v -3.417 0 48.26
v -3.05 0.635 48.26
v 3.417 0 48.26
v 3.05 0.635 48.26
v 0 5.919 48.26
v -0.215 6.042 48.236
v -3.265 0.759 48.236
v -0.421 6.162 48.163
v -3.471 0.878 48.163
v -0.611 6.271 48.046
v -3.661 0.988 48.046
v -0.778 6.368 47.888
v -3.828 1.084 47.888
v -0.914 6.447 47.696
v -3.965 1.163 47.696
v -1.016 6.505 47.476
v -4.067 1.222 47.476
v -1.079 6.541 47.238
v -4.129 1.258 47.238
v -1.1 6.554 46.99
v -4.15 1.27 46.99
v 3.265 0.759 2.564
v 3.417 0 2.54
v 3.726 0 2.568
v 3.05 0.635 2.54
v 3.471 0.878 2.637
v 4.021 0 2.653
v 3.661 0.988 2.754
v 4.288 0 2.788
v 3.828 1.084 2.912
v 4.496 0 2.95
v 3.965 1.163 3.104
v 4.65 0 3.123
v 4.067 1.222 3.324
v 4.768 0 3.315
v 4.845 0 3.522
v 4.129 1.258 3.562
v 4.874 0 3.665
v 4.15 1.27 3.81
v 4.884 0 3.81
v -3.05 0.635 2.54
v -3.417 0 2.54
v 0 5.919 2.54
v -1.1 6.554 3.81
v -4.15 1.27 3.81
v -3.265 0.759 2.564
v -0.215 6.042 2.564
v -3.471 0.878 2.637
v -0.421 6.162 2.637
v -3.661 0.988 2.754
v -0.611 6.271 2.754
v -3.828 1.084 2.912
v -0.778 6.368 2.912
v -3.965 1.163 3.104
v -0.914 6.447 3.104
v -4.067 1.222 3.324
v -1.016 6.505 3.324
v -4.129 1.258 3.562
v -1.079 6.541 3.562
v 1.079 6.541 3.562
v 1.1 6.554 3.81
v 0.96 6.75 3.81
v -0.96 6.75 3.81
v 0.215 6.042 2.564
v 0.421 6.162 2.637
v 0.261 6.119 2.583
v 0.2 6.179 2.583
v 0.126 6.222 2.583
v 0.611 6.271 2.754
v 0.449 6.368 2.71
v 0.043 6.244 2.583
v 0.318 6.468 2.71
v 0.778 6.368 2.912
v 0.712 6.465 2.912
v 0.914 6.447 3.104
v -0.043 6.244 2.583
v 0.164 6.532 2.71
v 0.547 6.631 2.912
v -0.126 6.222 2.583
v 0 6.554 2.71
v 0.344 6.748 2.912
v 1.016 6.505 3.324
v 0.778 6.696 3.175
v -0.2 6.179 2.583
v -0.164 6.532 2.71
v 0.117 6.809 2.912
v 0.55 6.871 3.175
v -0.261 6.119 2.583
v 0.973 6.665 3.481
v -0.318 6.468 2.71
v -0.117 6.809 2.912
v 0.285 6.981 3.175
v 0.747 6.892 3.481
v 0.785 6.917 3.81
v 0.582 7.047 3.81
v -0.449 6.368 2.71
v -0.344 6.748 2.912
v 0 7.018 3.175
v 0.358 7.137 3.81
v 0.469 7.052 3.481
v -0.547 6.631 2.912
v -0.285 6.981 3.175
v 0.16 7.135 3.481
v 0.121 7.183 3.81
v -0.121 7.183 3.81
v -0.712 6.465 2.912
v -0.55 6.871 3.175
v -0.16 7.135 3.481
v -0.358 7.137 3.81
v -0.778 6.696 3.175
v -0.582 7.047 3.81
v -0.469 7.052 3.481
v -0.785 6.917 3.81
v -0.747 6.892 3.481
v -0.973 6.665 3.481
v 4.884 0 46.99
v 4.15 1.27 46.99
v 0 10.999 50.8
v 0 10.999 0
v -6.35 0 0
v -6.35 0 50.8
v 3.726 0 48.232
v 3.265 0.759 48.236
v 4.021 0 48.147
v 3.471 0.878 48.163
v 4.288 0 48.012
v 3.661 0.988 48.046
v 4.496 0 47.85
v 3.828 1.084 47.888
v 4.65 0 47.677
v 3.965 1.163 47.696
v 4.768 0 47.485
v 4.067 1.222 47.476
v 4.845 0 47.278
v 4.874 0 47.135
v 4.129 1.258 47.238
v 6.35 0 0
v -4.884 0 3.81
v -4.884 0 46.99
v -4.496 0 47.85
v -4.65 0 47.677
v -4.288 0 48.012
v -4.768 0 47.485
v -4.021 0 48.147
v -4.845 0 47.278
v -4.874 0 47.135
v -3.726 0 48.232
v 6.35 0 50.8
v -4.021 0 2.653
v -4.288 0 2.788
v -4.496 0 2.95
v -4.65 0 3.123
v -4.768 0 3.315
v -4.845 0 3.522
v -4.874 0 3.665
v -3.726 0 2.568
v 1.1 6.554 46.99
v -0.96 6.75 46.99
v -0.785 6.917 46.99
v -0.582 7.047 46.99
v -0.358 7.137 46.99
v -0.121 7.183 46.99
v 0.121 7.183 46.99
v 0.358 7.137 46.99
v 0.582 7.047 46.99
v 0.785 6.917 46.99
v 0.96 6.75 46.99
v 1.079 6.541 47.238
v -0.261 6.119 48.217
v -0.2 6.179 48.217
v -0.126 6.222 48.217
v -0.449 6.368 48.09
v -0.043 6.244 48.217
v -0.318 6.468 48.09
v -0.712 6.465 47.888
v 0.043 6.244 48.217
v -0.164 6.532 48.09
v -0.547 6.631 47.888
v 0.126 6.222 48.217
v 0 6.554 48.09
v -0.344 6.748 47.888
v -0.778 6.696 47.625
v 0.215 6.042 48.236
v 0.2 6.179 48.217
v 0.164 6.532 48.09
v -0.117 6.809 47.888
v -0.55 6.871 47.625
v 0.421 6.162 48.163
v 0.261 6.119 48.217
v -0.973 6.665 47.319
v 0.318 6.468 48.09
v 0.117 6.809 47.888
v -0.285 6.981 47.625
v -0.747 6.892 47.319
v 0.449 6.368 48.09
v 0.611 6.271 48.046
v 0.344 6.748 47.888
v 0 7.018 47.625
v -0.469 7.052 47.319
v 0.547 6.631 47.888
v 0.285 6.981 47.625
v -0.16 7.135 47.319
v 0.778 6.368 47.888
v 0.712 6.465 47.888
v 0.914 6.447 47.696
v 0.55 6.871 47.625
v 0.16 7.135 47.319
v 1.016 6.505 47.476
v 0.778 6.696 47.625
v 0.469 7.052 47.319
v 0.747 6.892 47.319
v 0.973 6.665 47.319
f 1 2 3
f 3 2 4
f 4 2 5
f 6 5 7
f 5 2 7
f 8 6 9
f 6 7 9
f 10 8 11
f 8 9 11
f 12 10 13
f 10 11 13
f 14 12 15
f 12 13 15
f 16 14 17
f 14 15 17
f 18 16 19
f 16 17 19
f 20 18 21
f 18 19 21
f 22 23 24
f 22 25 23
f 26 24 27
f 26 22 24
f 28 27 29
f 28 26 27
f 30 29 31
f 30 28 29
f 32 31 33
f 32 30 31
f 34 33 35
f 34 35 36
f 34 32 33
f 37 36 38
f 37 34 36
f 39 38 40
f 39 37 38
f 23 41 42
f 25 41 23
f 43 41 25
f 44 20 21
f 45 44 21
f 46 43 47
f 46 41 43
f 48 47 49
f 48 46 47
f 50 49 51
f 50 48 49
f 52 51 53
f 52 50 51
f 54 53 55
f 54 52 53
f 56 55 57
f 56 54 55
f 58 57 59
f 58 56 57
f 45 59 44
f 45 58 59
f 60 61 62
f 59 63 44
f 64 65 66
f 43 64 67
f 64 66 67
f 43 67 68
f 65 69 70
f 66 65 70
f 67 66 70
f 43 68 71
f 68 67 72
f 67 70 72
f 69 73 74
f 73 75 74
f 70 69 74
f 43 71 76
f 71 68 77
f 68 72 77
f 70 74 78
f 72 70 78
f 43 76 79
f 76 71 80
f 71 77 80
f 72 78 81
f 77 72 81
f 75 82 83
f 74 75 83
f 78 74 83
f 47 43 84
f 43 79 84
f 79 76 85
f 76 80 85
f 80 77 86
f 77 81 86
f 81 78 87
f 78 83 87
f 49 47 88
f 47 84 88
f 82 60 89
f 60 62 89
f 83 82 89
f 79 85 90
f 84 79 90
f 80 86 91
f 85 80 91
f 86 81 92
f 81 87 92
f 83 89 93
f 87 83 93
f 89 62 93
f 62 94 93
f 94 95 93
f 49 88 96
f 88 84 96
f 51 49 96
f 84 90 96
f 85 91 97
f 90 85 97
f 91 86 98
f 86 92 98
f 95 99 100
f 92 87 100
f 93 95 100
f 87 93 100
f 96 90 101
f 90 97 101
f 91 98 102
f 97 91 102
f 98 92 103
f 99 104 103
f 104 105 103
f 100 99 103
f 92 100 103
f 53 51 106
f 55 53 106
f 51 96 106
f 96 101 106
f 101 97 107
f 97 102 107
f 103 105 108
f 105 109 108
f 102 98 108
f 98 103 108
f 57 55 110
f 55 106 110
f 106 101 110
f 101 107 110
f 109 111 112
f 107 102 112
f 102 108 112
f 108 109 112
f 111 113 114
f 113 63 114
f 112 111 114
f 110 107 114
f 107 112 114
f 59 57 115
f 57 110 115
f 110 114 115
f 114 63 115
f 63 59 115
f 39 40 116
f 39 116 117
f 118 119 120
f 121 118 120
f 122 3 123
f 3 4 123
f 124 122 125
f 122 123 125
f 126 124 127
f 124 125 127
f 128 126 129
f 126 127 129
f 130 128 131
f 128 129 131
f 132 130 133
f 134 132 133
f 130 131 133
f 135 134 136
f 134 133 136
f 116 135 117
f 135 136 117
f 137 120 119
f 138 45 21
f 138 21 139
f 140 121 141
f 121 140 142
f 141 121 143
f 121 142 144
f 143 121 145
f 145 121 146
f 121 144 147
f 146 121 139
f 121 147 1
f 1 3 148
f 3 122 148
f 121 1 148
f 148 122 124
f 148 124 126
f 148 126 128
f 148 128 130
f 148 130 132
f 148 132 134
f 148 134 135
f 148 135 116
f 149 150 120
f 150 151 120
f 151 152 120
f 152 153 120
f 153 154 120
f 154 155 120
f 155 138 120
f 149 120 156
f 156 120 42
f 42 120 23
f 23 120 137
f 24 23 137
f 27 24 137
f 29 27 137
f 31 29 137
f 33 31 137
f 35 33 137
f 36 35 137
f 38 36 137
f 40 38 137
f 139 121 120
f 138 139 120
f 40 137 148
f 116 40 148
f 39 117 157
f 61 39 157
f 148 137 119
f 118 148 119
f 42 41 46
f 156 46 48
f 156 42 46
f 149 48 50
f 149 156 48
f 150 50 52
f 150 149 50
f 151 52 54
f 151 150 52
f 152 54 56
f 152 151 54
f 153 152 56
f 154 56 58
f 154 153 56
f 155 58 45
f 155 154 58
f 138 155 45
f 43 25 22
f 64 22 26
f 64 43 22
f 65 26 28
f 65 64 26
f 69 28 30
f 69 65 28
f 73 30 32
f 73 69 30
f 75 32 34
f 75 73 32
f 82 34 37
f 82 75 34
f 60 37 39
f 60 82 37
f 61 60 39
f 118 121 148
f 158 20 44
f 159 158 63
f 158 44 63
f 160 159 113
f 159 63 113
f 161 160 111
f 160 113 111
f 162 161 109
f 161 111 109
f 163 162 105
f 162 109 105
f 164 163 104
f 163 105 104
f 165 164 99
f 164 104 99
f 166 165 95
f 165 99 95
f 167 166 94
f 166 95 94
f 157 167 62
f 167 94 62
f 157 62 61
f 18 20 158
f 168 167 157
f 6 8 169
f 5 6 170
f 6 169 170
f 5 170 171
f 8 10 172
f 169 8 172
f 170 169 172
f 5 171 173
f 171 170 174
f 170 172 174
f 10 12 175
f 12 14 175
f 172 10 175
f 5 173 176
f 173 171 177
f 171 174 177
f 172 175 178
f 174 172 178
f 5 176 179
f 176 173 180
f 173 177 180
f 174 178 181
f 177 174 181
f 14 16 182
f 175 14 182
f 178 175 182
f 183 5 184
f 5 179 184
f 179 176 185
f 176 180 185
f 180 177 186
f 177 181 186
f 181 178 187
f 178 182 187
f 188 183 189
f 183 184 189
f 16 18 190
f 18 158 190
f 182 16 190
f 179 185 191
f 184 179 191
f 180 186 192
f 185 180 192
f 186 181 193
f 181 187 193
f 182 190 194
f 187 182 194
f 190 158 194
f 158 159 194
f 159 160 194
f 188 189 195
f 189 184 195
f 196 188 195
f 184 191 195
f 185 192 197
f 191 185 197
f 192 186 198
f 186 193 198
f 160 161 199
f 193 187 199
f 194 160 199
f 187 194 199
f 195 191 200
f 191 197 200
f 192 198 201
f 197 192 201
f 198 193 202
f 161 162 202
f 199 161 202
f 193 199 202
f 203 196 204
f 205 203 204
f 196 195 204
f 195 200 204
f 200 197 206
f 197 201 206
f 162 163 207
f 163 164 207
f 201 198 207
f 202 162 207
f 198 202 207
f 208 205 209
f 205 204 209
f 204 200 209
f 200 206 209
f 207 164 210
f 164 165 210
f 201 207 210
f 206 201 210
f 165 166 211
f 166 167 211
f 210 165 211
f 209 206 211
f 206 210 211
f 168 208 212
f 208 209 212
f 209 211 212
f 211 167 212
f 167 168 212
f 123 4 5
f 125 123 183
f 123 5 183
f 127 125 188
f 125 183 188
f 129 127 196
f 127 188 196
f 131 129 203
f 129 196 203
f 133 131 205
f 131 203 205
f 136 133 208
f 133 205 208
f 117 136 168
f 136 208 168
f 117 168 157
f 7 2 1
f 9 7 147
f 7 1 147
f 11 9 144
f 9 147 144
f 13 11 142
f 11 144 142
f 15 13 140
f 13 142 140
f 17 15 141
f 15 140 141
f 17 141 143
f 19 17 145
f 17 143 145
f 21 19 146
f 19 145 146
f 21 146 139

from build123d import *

# Parameters (mm, degrees)
F1_DEPTH = 50.8
F4_DEPTH = 45.72
F5_R     = 1.27


with BuildPart() as f1:
    # F0 (on Top) → F1 (new body)
    with BuildSketch(Plane.XY):
        Polygon((-6.35, 0), (0, 0), (0, 10.9985226281), align=None)
        Polygon((0, 10.9985226281), (0, 0), (6.35, 0), align=None)
    extrude(amount=F1_DEPTH)

    # F3 (on offset) → F4 (cut)
    with BuildSketch(Plane.XY.offset(48.26)):
        Polygon((0, 8.4585226281), (-4.1502954744, 1.27), (4.1502954744, 1.27), align=None)
        Polygon((4.1502954744, 1.27), (-4.1502954744, 1.27), (-4.8835303163, 0), (4.8835303163, 0), align=None)
    extrude(amount=-F4_DEPTH, mode=Mode.SUBTRACT)

    # F5
    f5_edges = [f1.edges().sort_by_distance(p)[0] for p in [
        (0, 8.458523, 25.4),
        (2.441765, 4.229261, 2.54),
        (-2.441765, 4.229261, 2.54),
        (-2.441765, 4.229261, 48.26),
        (2.441765, 4.229261, 48.26),
    ]]
    fillet(f5_edges, radius=F5_R)


solid = f1.part
